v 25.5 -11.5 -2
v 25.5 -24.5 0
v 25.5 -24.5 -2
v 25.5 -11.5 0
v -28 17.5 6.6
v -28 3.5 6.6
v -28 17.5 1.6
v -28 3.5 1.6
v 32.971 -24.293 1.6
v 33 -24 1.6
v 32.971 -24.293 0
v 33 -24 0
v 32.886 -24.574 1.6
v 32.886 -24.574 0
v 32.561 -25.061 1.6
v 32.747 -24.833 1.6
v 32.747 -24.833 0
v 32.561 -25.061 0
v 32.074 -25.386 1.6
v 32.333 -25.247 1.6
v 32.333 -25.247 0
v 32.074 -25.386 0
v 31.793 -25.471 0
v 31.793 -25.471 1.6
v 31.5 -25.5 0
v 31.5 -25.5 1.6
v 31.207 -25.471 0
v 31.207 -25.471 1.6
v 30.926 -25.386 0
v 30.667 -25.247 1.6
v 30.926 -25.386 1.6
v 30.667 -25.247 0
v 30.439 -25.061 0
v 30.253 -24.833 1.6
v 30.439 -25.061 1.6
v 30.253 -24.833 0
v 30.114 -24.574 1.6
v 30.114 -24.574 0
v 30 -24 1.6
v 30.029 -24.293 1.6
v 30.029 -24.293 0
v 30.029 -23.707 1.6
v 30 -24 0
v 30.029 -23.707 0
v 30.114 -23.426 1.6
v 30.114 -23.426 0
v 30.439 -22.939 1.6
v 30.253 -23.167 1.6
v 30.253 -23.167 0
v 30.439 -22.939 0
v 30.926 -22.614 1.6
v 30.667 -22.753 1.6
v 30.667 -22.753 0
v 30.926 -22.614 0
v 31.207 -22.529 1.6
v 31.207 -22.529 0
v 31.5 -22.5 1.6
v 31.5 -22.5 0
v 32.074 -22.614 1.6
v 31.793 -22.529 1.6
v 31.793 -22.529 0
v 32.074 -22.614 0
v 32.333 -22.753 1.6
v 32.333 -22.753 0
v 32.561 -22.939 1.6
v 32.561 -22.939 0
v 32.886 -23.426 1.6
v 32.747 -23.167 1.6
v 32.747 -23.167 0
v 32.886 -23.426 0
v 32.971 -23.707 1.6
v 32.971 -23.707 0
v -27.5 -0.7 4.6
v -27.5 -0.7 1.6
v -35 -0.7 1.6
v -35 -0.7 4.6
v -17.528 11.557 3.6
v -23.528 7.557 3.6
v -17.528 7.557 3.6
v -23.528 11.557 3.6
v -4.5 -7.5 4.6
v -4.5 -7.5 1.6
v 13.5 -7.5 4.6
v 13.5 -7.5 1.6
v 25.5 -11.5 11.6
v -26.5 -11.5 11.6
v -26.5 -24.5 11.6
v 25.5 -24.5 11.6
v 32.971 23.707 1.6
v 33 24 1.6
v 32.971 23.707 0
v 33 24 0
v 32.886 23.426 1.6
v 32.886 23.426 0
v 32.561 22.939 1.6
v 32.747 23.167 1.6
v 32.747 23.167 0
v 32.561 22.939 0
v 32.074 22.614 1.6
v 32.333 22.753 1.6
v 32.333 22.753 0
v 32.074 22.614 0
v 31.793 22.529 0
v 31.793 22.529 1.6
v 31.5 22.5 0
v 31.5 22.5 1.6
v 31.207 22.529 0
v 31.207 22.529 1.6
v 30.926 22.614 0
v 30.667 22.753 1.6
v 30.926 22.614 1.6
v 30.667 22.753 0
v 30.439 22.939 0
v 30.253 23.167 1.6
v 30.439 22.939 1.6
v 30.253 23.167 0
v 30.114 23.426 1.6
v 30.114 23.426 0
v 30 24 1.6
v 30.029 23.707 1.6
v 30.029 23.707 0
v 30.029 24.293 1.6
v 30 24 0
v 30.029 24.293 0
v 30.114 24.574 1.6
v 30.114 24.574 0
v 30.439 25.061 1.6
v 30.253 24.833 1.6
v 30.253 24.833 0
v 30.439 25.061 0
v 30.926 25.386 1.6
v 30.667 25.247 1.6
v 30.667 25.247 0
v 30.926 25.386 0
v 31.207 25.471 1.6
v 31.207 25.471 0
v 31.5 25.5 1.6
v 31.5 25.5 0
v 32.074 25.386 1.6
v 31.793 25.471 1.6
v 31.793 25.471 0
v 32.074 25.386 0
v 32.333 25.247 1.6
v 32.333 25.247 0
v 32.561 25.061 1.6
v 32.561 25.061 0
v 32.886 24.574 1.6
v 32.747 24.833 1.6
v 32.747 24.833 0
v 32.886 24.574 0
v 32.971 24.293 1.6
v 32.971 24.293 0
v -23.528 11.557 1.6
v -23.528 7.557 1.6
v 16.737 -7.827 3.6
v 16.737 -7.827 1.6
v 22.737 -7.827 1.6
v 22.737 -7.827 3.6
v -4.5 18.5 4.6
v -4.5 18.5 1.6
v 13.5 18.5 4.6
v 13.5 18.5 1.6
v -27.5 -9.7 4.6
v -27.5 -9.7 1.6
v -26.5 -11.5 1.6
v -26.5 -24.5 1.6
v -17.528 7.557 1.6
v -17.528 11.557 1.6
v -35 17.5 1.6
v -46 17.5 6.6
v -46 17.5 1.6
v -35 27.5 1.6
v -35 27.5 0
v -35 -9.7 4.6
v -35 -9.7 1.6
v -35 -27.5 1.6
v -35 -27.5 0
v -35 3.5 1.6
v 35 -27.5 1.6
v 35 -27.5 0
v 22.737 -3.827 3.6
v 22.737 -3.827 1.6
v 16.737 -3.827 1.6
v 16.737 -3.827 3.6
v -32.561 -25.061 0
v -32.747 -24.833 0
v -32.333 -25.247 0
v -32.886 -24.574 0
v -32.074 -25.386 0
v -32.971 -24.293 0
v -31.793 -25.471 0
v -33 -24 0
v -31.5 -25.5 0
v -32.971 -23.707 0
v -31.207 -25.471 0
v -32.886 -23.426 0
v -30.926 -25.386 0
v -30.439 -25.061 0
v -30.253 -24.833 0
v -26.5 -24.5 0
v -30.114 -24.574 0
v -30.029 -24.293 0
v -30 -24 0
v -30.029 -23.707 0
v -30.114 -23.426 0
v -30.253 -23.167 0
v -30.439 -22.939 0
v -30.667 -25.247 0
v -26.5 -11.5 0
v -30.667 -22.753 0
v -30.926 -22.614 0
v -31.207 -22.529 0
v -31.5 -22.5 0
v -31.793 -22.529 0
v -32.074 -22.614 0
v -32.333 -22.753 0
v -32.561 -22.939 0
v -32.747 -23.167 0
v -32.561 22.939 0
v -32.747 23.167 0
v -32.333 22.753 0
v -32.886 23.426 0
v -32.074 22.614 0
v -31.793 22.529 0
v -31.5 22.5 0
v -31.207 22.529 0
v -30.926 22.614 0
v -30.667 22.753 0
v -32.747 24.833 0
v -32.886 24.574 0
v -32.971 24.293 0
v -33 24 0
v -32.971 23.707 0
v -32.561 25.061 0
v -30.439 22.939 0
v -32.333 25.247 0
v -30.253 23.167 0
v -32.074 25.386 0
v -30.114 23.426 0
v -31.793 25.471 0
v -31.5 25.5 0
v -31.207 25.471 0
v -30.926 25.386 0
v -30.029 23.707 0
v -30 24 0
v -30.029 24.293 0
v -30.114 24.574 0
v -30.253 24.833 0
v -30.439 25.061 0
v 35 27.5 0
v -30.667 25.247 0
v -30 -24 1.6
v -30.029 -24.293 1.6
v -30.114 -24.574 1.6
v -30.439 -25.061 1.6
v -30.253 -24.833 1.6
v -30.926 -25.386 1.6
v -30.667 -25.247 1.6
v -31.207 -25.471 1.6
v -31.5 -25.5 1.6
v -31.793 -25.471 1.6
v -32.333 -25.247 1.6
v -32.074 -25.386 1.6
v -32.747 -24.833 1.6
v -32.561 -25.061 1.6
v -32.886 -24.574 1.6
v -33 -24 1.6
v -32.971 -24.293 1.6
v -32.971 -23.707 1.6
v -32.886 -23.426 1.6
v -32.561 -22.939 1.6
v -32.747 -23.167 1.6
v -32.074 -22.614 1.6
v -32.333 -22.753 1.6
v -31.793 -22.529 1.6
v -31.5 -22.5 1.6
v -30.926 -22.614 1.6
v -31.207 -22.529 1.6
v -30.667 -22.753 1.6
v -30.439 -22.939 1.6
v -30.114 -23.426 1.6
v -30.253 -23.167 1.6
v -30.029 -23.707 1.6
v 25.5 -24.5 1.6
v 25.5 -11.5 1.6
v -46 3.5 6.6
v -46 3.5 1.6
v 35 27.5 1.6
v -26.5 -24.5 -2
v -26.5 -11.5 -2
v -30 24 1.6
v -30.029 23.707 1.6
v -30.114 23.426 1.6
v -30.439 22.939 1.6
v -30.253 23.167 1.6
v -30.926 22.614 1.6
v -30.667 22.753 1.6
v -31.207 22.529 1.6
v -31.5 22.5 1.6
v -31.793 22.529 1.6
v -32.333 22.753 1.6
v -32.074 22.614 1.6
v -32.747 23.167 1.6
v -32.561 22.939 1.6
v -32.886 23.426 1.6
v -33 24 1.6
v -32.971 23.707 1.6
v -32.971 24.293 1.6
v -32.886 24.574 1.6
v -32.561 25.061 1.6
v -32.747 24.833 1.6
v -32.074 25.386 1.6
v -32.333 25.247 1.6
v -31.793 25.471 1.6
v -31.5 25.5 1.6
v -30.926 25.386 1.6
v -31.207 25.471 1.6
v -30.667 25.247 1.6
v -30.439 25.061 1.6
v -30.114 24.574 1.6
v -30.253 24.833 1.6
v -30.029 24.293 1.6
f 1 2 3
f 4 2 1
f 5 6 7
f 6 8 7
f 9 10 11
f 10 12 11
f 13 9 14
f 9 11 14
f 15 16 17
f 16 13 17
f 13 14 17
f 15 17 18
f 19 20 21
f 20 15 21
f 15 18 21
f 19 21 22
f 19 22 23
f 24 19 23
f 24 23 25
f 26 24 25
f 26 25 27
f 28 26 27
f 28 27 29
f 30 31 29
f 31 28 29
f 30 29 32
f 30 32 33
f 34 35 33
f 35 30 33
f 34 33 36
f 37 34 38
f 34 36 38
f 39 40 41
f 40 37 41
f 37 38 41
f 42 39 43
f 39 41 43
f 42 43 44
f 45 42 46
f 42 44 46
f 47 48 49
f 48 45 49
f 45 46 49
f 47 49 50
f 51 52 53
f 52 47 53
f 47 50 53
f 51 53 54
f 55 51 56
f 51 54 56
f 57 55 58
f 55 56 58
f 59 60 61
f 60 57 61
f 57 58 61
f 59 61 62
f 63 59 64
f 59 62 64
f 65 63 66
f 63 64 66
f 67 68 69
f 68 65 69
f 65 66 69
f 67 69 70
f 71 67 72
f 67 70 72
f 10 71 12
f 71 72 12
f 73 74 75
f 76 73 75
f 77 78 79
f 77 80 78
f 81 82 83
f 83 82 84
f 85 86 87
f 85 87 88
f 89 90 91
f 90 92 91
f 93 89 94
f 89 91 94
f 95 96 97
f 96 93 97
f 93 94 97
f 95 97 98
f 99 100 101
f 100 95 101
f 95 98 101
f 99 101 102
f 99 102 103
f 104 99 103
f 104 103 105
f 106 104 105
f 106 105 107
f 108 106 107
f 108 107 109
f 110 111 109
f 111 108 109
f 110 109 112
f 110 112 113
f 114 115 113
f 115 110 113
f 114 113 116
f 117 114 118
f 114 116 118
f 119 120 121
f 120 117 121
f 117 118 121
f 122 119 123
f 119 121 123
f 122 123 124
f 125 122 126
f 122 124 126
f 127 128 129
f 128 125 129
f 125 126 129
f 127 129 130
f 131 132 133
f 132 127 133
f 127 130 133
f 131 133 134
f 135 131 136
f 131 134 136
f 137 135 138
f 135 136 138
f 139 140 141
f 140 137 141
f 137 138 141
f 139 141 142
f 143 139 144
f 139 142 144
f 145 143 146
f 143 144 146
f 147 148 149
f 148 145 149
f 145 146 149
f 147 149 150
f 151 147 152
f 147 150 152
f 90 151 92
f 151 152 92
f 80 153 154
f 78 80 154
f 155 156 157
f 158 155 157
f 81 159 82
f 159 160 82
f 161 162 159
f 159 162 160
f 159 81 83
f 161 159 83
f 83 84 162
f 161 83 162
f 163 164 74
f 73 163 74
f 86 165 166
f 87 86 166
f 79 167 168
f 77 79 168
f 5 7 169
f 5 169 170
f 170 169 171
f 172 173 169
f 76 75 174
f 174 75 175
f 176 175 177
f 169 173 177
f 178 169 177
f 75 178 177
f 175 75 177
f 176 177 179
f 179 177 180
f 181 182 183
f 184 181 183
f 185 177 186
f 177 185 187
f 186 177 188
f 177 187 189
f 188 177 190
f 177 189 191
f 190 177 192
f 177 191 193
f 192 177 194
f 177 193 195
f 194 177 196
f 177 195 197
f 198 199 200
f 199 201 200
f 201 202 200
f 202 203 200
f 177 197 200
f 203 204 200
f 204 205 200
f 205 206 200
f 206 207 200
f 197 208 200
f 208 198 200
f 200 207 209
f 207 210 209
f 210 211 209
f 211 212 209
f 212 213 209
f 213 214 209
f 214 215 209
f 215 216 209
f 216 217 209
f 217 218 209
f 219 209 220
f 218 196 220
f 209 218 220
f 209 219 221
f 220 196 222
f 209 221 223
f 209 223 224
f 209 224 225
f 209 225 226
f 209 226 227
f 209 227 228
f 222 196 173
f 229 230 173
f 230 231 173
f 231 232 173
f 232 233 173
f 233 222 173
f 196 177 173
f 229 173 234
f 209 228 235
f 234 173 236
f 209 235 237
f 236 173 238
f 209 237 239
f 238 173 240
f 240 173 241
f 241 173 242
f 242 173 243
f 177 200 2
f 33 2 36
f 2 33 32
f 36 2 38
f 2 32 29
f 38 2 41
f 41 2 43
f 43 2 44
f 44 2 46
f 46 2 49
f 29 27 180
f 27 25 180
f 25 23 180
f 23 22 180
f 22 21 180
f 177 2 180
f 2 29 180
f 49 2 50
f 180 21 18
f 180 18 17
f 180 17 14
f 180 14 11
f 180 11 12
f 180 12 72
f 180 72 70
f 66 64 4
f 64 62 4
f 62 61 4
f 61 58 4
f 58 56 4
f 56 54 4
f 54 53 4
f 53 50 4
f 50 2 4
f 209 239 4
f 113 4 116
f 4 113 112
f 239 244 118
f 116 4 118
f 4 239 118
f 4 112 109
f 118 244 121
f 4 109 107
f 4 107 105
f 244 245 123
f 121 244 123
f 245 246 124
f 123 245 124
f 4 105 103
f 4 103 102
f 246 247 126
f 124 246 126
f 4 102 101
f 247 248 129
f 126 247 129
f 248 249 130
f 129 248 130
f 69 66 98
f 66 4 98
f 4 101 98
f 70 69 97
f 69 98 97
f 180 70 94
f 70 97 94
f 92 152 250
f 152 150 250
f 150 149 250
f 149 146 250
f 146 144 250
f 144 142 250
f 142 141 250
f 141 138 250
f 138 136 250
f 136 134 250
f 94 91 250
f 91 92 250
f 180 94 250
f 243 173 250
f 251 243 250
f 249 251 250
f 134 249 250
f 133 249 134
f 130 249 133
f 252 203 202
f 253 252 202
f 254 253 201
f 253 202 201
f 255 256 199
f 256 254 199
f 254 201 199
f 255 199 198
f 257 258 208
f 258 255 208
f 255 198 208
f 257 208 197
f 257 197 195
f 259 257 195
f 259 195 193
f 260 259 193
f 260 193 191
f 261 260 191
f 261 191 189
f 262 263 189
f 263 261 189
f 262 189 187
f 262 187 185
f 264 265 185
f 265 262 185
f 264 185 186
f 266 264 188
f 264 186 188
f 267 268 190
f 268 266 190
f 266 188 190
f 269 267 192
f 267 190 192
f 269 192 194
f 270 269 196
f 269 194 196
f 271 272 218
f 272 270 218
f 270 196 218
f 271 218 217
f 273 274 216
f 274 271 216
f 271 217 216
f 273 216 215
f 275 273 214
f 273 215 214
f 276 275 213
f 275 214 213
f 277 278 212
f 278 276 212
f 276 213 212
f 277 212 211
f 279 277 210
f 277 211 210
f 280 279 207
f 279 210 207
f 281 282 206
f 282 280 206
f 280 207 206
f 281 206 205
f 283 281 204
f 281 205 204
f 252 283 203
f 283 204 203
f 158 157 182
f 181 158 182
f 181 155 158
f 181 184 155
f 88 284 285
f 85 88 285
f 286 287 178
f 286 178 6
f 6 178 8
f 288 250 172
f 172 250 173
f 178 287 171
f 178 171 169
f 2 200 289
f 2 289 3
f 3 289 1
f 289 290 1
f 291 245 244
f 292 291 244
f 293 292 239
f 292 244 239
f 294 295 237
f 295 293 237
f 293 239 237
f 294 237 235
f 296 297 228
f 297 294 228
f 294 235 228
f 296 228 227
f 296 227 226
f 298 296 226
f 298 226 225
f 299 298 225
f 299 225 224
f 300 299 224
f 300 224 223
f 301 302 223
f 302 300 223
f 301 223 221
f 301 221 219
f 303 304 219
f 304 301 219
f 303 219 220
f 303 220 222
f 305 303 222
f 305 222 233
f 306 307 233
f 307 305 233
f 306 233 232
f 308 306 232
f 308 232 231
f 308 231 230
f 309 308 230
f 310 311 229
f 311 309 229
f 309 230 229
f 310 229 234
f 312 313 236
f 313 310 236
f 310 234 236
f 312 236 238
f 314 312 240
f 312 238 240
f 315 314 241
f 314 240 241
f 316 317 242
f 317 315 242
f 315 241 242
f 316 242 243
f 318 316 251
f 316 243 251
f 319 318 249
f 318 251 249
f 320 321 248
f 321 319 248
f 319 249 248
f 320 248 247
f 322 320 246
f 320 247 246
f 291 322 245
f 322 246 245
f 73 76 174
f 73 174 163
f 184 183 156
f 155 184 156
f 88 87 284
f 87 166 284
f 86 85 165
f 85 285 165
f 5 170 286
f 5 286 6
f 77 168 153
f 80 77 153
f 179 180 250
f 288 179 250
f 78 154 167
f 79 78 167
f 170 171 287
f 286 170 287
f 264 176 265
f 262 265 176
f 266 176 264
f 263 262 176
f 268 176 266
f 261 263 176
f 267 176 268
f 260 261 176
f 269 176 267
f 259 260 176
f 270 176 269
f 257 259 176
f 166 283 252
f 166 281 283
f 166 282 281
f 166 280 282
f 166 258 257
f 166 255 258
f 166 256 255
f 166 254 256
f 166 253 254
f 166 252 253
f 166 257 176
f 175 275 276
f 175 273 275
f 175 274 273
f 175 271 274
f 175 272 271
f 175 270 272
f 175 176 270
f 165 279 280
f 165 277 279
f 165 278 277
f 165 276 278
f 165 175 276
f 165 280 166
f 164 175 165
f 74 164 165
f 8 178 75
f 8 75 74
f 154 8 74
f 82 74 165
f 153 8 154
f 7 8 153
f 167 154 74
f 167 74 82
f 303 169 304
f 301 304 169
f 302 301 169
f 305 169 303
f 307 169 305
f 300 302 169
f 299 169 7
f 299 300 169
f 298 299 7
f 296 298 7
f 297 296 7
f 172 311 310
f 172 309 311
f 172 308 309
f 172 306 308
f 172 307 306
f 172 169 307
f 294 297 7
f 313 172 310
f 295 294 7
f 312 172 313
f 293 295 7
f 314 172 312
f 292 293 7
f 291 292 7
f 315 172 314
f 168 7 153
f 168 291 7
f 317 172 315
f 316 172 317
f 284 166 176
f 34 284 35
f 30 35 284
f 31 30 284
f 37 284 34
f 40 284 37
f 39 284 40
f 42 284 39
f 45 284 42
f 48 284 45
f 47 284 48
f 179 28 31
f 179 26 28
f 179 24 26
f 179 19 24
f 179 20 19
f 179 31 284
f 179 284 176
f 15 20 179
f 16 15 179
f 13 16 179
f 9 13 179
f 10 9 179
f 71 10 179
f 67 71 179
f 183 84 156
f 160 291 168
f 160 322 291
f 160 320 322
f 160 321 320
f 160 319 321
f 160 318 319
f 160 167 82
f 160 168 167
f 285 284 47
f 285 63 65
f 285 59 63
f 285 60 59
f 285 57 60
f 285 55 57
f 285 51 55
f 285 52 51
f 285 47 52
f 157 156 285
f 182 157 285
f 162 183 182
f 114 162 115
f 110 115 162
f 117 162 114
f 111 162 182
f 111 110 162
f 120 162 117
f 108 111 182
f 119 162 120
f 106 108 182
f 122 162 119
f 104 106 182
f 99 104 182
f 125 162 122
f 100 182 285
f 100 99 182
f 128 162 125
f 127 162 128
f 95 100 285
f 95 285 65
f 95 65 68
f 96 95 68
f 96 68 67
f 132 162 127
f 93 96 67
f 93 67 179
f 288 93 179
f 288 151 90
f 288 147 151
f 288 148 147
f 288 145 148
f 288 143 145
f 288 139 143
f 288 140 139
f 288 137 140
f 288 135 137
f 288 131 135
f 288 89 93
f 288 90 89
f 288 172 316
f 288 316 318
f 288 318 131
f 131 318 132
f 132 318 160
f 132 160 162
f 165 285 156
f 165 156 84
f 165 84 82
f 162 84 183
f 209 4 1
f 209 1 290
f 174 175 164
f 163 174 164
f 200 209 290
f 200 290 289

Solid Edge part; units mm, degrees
sketch "Sketch1" plane through (0, 0, 0) normal (0, 0, 1) x (1, 0, 0)
  line L0 (-35, -27.5) -> (35, -27.5)
  line L1 (35, -27.5) -> (35, 27.5)
  line L2 (35, 27.5) -> (-35, 27.5)
  line L3 (-35, 27.5) -> (-35, -27.5)
extrude "Protrusion1" add sketch "Sketch1" along normal blind 1.6
sketch "Sketch2" plane through (0, 0, 0) normal (0, 0, 1) x (1, 0, 0)
  circle A0 centre (-31.5, -24) radius 1.5
  circle A1 centre (-31.5, 24) radius 1.5
  circle A2 centre (31.5, 24) radius 1.5
  circle A3 centre (31.5, -24) radius 1.5
  dimension "D1" = 70
  dimension "D2" = 55
  dimension "D3" = 48
  dimension "D4" = 3
  dimension "D5" = 63
extrude "Cutout1" cut sketch "Sketch2" along normal up to vertex (1.6 mm away)
sketch "Sketch3" plane through (0, 0, 1.6) normal (0, 0, 1) x (1, 0, 0)
  line L0 (-28, 17.5) -> (-46, 17.5)
  line L1 (-46, 17.5) -> (-46, 3.5)
  line L2 (-46, 3.5) -> (-28, 3.5)
  line L3 (-28, 3.5) -> (-28, 17.5)
extrude "ExtrudedProtrusion_2" add sketch "Sketch3" along normal blind 5
sketch "Sketch4" plane through (0, 0, 1.6) normal (0, 0, 1) x (1, 0, 0)
  line L0 (-35, -0.7) -> (-35, -9.7)
  line L1 (-35, -9.7) -> (-27.5, -9.7)
  line L2 (-27.5, -9.7) -> (-27.5, -0.7)
  line L3 (-27.5, -0.7) -> (-35, -0.7)
extrude "ExtrudedProtrusion_3" add sketch "Sketch4" along normal blind 3
sketch "Sketch5" plane through (0, 0, 1.6) normal (0, 0, 1) x (1, 0, 0)
  line L0 (25.5, -11.5) -> (-26.5, -11.5)
  line L1 (-26.5, -11.5) -> (-26.5, -24.5)
  line L2 (-26.5, -24.5) -> (25.5, -24.5)
  line L3 (25.5, -24.5) -> (25.5, -11.5)
extrude "ExtrudedProtrusion_4" add sketch "Sketch5" along normal blind 10
sketch "Sketch6" plane through (0, 0, 1.6) normal (0, 0, 1) x (1, 0, 0)
  line L0 (-23.5285, 7.5572) -> (-17.5285, 7.5572)
  line L1 (-17.5285, 7.5572) -> (-17.5285, 11.5572)
  line L2 (-17.5285, 11.5572) -> (-23.5285, 11.5572)
  line L3 (-23.5285, 11.5572) -> (-23.5285, 7.5572)
  line L4 (22.7373, -7.827) -> (22.7373, -3.827)
  line L5 (22.7373, -3.827) -> (16.7373, -3.827)
  line L6 (16.7373, -3.827) -> (16.7373, -7.827)
  line L7 (16.7373, -7.827) -> (22.7373, -7.827)
  dimension "D1" = 11
  dimension "D2" = 18
  dimension "D3" = 14
  dimension "D4" = 10
  dimension "D5" = 7.5
  dimension "D6" = 9
  dimension "D7" = 17.8
  dimension "D8" = 52
  dimension "D9" = 13
  dimension "D10" = 8.5
  dimension "D11" = 3
  dimension "D12" = 26
  dimension "D13" = 18
  dimension "D14" = 6
  dimension "D15" = 4
  dimension "D16" = 4
  dimension "D17" = 6
  dimension "D18" = 21.5
  dimension "D19" = 9
extrude "ExtrudedProtrusion_5" add sketch "Sketch6" along normal blind 2
sketch "Sketch7" plane through (0, 0, 1.6) normal (0, 0, 1) x (1, 0, 0)
  line L0 (13.5, 18.5) -> (-4.5, 18.5)
  line L1 (-4.5, 18.5) -> (-4.5, -7.5)
  line L2 (-4.5, -7.5) -> (13.5, -7.5)
  line L3 (13.5, -7.5) -> (13.5, 18.5)
extrude "ExtrudedProtrusion_6" add sketch "Sketch7" along normal blind 3
sketch "Sketch8" plane through (0, 0, 0) normal (0, 0, -1) x (-1, 0, 0)
  line L0 (26.5, -24.5) -> (-25.5, -24.5)
  line L1 (-25.5, -24.5) -> (-25.5, -11.5)
  line L2 (-25.5, -11.5) -> (26.5, -11.5)
  line L3 (26.5, -11.5) -> (26.5, -24.5)
extrude "ExtrudedProtrusion_7" add sketch "Sketch8" along normal blind 2
properties material "Polycarbonate"
